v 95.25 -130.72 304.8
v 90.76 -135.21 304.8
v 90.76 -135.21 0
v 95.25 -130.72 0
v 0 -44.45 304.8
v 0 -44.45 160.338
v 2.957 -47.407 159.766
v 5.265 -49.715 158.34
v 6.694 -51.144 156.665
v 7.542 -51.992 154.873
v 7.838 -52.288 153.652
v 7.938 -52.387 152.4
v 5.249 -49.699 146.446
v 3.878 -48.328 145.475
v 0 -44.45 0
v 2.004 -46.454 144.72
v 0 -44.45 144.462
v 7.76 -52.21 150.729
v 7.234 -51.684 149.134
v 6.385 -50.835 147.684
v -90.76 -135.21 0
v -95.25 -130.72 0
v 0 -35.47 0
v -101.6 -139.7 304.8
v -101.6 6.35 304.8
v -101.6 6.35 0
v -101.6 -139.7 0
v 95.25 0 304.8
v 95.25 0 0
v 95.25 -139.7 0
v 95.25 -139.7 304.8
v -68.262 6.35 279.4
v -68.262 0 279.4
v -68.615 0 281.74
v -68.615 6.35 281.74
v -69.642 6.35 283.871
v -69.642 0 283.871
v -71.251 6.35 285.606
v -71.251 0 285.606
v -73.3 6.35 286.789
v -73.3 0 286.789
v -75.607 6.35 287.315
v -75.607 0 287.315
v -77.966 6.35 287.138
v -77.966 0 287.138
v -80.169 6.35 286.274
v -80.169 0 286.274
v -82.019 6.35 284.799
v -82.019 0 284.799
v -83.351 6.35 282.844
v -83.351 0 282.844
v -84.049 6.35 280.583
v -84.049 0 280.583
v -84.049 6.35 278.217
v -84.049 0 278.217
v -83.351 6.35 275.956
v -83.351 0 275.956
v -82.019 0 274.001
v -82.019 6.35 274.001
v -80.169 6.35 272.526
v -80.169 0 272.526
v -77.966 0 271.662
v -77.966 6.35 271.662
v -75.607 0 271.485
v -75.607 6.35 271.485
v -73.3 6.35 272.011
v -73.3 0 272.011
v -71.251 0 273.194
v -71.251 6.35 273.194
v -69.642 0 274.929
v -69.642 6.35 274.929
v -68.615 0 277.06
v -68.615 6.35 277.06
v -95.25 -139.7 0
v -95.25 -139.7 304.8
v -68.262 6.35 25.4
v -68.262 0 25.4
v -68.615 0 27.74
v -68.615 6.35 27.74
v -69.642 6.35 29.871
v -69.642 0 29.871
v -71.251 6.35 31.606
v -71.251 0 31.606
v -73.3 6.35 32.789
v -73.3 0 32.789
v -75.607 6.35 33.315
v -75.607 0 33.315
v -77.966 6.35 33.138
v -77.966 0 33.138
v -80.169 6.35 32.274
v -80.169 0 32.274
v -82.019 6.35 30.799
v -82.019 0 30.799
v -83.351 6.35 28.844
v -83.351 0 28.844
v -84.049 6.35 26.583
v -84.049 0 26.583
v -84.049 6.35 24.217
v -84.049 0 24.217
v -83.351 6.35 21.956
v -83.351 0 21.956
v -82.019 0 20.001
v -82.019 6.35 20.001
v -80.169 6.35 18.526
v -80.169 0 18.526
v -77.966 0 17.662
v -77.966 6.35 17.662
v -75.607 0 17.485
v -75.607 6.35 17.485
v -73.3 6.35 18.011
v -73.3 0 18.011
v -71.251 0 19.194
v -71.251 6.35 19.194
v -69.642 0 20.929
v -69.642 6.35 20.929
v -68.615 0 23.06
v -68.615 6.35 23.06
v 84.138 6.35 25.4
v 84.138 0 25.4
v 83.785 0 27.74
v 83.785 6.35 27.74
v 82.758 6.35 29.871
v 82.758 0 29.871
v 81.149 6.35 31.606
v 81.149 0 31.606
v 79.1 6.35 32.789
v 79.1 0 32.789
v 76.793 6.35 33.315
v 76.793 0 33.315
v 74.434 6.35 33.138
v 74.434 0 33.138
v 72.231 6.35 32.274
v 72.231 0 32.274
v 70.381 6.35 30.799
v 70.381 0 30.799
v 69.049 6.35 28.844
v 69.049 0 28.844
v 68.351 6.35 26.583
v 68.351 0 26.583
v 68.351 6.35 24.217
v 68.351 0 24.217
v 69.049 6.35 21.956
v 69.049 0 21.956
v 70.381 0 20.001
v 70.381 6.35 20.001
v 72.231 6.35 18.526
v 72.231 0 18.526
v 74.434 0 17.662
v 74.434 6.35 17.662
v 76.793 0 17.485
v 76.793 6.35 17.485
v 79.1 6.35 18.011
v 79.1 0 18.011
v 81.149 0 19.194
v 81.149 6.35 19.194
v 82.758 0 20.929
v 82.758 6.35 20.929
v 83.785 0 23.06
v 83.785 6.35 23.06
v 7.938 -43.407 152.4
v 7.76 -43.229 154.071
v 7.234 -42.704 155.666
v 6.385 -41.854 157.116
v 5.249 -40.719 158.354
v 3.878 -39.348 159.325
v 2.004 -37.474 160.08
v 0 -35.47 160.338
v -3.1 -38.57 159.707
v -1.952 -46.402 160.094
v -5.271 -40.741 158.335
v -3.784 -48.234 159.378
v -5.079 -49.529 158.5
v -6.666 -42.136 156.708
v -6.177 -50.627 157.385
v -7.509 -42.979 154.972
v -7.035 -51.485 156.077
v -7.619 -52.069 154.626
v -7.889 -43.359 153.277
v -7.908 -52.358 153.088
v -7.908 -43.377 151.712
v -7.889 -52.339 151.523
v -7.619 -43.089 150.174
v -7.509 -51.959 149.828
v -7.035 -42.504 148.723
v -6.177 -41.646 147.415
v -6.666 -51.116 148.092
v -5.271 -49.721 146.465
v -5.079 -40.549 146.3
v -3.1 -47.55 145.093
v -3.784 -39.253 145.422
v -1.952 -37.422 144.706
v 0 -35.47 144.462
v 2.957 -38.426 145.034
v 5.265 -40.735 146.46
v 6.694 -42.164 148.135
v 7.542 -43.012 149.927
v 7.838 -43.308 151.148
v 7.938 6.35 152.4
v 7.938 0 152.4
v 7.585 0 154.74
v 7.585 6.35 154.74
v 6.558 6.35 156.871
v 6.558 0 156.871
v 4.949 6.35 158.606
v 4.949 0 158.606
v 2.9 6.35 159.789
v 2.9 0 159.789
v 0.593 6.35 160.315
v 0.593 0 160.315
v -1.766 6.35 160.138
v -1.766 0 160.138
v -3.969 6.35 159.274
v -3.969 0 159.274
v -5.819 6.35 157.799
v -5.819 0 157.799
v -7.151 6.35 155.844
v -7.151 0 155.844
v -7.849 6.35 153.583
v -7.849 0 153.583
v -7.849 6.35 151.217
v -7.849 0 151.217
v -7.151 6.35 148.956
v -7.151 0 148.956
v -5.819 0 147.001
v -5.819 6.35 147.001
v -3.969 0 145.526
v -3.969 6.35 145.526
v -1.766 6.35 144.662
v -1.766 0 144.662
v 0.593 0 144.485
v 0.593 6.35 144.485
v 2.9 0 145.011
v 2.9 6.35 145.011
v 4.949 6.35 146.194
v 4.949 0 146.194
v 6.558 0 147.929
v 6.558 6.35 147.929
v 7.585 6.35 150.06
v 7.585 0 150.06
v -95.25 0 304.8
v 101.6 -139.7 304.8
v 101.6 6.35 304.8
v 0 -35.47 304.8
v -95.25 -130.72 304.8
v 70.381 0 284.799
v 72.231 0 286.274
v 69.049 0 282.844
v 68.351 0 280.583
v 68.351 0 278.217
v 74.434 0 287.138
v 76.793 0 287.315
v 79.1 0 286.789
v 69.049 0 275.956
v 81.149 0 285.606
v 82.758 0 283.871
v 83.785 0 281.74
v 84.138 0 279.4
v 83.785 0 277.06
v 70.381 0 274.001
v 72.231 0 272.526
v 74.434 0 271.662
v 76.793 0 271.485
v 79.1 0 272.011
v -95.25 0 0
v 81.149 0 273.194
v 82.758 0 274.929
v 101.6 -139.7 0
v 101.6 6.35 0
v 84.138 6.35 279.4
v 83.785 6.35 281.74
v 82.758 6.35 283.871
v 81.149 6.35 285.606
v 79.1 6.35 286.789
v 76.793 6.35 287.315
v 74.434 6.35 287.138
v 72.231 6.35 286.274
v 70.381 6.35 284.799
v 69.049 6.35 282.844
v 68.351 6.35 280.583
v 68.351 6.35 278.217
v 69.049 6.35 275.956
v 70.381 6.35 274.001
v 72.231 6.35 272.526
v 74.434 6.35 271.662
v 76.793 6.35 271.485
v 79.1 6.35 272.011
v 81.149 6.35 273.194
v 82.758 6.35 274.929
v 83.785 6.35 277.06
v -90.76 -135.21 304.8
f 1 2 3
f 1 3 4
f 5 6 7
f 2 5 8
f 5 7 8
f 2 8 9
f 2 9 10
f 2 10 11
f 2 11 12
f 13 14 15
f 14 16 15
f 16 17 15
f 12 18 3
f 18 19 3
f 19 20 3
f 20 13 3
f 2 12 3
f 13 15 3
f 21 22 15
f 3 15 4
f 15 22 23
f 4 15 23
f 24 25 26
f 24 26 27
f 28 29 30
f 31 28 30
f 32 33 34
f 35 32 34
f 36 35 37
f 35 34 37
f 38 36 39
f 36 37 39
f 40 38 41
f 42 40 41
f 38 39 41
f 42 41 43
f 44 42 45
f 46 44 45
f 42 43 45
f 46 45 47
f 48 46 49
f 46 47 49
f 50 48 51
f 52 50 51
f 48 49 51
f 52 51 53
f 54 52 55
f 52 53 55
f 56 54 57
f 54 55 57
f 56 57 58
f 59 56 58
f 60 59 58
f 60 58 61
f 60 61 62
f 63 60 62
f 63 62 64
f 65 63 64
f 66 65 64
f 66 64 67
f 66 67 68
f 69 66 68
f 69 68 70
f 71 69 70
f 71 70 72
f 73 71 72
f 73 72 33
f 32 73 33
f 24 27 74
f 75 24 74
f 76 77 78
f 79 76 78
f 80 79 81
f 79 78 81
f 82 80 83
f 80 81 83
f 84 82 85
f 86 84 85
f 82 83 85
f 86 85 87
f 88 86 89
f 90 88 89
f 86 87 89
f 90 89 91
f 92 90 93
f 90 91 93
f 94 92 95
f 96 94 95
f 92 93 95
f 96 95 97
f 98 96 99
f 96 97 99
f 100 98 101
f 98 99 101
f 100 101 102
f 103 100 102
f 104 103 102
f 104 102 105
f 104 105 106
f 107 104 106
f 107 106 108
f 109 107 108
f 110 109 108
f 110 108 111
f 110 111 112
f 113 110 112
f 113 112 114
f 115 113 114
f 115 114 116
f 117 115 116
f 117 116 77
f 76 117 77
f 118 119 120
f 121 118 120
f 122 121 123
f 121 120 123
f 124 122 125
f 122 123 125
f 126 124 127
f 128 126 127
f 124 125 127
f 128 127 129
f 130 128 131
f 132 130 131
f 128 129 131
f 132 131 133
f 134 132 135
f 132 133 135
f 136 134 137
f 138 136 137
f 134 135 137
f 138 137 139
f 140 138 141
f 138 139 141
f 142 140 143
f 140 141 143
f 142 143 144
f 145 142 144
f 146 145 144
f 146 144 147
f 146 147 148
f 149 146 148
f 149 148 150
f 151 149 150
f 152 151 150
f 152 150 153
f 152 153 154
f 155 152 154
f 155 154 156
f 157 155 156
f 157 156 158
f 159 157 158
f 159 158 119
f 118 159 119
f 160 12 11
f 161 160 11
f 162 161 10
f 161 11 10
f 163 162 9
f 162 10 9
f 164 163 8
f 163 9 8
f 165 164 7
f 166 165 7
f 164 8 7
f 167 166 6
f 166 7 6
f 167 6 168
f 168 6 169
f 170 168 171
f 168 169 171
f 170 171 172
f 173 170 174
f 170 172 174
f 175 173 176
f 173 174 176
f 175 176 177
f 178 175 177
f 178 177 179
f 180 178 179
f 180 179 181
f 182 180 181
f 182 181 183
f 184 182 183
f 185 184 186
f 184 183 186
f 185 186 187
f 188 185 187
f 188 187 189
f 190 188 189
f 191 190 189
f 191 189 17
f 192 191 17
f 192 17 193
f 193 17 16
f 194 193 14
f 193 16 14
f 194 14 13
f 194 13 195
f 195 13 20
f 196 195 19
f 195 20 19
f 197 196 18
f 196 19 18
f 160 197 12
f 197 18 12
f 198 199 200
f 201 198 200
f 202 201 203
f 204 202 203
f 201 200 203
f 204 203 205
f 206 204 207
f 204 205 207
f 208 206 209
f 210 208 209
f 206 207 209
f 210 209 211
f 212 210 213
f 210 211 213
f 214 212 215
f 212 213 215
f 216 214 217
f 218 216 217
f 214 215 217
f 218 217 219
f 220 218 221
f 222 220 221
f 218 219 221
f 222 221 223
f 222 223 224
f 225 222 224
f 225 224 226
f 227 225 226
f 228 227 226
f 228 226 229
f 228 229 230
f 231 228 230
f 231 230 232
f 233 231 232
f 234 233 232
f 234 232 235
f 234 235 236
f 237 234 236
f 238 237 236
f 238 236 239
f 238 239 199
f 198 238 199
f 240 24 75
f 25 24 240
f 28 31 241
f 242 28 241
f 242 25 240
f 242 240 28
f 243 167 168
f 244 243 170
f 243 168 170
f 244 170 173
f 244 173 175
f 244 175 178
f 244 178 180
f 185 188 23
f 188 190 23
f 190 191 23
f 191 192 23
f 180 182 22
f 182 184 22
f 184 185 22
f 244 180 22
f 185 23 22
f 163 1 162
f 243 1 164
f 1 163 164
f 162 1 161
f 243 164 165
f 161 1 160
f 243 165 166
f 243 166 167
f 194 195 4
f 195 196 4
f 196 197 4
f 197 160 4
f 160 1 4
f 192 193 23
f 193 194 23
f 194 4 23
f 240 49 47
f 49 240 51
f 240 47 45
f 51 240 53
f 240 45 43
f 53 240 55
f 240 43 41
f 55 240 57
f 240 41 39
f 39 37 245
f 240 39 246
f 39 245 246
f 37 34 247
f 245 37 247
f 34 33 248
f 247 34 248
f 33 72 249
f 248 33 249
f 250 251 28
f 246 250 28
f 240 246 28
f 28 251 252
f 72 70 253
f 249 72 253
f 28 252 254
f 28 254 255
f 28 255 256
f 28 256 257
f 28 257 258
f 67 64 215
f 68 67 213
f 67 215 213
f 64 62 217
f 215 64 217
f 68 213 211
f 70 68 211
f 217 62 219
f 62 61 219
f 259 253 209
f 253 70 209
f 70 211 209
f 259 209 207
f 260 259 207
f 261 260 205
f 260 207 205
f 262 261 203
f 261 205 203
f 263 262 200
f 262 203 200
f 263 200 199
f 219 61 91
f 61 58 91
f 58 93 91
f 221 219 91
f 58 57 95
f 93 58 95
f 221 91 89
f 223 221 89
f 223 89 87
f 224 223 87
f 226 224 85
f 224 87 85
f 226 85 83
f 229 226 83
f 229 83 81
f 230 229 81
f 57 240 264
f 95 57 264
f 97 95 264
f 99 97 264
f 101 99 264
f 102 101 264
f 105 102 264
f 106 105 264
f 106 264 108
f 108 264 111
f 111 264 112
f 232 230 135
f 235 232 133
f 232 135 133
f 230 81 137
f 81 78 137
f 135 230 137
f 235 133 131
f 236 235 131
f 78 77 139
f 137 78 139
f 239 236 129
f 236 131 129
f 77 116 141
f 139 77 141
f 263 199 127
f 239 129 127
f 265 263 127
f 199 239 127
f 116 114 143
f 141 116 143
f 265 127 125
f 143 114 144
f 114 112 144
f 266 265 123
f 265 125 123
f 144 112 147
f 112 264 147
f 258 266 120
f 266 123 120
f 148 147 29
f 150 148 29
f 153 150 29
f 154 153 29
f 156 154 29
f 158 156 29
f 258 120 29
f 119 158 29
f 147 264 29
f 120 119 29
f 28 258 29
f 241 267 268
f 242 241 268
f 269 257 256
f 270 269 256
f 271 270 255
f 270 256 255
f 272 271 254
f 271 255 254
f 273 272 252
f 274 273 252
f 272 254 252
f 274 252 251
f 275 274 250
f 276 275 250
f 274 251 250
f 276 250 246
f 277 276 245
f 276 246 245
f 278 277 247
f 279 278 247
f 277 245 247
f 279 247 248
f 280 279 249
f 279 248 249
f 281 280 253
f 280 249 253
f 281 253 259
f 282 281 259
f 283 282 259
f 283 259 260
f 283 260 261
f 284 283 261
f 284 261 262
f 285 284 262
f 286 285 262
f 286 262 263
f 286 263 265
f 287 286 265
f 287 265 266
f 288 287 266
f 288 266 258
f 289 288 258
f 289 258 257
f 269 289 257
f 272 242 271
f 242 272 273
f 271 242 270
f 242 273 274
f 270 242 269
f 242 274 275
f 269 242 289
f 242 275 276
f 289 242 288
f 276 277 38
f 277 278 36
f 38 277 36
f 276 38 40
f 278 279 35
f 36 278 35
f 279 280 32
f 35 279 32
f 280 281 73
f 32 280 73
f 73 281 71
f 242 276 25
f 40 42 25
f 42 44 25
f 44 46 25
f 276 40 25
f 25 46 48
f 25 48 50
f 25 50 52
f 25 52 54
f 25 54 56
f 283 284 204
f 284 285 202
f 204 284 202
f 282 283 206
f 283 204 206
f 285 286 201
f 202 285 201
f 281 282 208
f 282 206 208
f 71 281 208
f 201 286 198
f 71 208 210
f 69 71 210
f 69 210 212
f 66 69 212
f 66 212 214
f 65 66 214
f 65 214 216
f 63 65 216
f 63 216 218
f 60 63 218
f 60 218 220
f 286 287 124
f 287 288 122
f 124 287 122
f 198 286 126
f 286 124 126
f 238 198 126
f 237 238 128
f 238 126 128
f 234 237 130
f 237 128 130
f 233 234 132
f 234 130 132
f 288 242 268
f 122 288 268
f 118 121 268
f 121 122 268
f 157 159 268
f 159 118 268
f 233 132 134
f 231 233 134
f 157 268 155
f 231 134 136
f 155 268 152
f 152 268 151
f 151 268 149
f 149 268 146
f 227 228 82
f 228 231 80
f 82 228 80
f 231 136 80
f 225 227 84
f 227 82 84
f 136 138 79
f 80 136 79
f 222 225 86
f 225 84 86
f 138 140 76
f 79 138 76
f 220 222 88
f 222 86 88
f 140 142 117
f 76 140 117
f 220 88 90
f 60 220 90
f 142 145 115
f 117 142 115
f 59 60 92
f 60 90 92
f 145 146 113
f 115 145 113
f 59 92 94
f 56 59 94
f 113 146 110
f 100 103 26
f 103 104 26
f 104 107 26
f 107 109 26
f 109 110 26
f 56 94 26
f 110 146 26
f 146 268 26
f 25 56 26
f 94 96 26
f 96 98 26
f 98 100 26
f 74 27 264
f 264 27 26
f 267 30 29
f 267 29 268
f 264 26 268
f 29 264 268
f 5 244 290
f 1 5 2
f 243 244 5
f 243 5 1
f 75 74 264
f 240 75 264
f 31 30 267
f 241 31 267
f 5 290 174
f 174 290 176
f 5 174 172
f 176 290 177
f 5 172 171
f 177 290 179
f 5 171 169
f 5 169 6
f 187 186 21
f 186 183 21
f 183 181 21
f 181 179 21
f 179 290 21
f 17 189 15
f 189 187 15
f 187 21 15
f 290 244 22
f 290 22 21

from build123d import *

# Parameters (mm, degrees)
F1_DEPTH = 304.8
F4_DEPTH = 304.8
F6_D     = 15.875
F6_DEPTH = 12.7
F8_D     = 15.875
F8_2_D   = 15.875


with BuildPart() as f1:
    # F0 (on Top) → F1 (new body)
    with BuildSketch(Plane.XY):
        Polygon((-95.25, -139.7), (-95.25, 0), (95.25, 0), (95.25, -139.7), (101.6, -139.7), (101.6, 6.35), (-101.6, 6.35), (-101.6, -139.7), align=None)
    extrude(amount=F1_DEPTH)

    # F6
    with Locations(Plane(origin=(0, 6.35, 0), x_dir=(-1, 0, 0), z_dir=(0, 1, 0))):
        with Locations((-76.2, 279.4), (76.2, 279.4), (-76.2, 25.4), (76.2, 25.4)):
            Hole(F6_D / 2, depth=F6_DEPTH)

    # F8 (through all)
    with Locations(Plane(origin=(0, 6.35, 0), x_dir=(-1, 0, 0), z_dir=(0, 1, 0))):
        with Locations((0, 152.4)):
            Hole(F8_D / 2)


with BuildPart() as f4:
    # F3 (on Top) → F4 (new body, through all)
    with BuildSketch(Plane.XY):
        Polygon((-95.25, -130.719744), (-90.759872, -135.209872), (0, -44.45), (90.759872, -135.209872), (95.25, -130.719744), (0, -35.469744), align=None)
    extrude(amount=F4_DEPTH)

    # F8#2 (through all)
    with Locations(Plane(origin=(0, 6.35, 0), x_dir=(-1, 0, 0), z_dir=(0, 1, 0))):
        with Locations((0, 152.4)):
            Hole(F8_2_D / 2)


solid = Compound([f1.part, f4.part])
